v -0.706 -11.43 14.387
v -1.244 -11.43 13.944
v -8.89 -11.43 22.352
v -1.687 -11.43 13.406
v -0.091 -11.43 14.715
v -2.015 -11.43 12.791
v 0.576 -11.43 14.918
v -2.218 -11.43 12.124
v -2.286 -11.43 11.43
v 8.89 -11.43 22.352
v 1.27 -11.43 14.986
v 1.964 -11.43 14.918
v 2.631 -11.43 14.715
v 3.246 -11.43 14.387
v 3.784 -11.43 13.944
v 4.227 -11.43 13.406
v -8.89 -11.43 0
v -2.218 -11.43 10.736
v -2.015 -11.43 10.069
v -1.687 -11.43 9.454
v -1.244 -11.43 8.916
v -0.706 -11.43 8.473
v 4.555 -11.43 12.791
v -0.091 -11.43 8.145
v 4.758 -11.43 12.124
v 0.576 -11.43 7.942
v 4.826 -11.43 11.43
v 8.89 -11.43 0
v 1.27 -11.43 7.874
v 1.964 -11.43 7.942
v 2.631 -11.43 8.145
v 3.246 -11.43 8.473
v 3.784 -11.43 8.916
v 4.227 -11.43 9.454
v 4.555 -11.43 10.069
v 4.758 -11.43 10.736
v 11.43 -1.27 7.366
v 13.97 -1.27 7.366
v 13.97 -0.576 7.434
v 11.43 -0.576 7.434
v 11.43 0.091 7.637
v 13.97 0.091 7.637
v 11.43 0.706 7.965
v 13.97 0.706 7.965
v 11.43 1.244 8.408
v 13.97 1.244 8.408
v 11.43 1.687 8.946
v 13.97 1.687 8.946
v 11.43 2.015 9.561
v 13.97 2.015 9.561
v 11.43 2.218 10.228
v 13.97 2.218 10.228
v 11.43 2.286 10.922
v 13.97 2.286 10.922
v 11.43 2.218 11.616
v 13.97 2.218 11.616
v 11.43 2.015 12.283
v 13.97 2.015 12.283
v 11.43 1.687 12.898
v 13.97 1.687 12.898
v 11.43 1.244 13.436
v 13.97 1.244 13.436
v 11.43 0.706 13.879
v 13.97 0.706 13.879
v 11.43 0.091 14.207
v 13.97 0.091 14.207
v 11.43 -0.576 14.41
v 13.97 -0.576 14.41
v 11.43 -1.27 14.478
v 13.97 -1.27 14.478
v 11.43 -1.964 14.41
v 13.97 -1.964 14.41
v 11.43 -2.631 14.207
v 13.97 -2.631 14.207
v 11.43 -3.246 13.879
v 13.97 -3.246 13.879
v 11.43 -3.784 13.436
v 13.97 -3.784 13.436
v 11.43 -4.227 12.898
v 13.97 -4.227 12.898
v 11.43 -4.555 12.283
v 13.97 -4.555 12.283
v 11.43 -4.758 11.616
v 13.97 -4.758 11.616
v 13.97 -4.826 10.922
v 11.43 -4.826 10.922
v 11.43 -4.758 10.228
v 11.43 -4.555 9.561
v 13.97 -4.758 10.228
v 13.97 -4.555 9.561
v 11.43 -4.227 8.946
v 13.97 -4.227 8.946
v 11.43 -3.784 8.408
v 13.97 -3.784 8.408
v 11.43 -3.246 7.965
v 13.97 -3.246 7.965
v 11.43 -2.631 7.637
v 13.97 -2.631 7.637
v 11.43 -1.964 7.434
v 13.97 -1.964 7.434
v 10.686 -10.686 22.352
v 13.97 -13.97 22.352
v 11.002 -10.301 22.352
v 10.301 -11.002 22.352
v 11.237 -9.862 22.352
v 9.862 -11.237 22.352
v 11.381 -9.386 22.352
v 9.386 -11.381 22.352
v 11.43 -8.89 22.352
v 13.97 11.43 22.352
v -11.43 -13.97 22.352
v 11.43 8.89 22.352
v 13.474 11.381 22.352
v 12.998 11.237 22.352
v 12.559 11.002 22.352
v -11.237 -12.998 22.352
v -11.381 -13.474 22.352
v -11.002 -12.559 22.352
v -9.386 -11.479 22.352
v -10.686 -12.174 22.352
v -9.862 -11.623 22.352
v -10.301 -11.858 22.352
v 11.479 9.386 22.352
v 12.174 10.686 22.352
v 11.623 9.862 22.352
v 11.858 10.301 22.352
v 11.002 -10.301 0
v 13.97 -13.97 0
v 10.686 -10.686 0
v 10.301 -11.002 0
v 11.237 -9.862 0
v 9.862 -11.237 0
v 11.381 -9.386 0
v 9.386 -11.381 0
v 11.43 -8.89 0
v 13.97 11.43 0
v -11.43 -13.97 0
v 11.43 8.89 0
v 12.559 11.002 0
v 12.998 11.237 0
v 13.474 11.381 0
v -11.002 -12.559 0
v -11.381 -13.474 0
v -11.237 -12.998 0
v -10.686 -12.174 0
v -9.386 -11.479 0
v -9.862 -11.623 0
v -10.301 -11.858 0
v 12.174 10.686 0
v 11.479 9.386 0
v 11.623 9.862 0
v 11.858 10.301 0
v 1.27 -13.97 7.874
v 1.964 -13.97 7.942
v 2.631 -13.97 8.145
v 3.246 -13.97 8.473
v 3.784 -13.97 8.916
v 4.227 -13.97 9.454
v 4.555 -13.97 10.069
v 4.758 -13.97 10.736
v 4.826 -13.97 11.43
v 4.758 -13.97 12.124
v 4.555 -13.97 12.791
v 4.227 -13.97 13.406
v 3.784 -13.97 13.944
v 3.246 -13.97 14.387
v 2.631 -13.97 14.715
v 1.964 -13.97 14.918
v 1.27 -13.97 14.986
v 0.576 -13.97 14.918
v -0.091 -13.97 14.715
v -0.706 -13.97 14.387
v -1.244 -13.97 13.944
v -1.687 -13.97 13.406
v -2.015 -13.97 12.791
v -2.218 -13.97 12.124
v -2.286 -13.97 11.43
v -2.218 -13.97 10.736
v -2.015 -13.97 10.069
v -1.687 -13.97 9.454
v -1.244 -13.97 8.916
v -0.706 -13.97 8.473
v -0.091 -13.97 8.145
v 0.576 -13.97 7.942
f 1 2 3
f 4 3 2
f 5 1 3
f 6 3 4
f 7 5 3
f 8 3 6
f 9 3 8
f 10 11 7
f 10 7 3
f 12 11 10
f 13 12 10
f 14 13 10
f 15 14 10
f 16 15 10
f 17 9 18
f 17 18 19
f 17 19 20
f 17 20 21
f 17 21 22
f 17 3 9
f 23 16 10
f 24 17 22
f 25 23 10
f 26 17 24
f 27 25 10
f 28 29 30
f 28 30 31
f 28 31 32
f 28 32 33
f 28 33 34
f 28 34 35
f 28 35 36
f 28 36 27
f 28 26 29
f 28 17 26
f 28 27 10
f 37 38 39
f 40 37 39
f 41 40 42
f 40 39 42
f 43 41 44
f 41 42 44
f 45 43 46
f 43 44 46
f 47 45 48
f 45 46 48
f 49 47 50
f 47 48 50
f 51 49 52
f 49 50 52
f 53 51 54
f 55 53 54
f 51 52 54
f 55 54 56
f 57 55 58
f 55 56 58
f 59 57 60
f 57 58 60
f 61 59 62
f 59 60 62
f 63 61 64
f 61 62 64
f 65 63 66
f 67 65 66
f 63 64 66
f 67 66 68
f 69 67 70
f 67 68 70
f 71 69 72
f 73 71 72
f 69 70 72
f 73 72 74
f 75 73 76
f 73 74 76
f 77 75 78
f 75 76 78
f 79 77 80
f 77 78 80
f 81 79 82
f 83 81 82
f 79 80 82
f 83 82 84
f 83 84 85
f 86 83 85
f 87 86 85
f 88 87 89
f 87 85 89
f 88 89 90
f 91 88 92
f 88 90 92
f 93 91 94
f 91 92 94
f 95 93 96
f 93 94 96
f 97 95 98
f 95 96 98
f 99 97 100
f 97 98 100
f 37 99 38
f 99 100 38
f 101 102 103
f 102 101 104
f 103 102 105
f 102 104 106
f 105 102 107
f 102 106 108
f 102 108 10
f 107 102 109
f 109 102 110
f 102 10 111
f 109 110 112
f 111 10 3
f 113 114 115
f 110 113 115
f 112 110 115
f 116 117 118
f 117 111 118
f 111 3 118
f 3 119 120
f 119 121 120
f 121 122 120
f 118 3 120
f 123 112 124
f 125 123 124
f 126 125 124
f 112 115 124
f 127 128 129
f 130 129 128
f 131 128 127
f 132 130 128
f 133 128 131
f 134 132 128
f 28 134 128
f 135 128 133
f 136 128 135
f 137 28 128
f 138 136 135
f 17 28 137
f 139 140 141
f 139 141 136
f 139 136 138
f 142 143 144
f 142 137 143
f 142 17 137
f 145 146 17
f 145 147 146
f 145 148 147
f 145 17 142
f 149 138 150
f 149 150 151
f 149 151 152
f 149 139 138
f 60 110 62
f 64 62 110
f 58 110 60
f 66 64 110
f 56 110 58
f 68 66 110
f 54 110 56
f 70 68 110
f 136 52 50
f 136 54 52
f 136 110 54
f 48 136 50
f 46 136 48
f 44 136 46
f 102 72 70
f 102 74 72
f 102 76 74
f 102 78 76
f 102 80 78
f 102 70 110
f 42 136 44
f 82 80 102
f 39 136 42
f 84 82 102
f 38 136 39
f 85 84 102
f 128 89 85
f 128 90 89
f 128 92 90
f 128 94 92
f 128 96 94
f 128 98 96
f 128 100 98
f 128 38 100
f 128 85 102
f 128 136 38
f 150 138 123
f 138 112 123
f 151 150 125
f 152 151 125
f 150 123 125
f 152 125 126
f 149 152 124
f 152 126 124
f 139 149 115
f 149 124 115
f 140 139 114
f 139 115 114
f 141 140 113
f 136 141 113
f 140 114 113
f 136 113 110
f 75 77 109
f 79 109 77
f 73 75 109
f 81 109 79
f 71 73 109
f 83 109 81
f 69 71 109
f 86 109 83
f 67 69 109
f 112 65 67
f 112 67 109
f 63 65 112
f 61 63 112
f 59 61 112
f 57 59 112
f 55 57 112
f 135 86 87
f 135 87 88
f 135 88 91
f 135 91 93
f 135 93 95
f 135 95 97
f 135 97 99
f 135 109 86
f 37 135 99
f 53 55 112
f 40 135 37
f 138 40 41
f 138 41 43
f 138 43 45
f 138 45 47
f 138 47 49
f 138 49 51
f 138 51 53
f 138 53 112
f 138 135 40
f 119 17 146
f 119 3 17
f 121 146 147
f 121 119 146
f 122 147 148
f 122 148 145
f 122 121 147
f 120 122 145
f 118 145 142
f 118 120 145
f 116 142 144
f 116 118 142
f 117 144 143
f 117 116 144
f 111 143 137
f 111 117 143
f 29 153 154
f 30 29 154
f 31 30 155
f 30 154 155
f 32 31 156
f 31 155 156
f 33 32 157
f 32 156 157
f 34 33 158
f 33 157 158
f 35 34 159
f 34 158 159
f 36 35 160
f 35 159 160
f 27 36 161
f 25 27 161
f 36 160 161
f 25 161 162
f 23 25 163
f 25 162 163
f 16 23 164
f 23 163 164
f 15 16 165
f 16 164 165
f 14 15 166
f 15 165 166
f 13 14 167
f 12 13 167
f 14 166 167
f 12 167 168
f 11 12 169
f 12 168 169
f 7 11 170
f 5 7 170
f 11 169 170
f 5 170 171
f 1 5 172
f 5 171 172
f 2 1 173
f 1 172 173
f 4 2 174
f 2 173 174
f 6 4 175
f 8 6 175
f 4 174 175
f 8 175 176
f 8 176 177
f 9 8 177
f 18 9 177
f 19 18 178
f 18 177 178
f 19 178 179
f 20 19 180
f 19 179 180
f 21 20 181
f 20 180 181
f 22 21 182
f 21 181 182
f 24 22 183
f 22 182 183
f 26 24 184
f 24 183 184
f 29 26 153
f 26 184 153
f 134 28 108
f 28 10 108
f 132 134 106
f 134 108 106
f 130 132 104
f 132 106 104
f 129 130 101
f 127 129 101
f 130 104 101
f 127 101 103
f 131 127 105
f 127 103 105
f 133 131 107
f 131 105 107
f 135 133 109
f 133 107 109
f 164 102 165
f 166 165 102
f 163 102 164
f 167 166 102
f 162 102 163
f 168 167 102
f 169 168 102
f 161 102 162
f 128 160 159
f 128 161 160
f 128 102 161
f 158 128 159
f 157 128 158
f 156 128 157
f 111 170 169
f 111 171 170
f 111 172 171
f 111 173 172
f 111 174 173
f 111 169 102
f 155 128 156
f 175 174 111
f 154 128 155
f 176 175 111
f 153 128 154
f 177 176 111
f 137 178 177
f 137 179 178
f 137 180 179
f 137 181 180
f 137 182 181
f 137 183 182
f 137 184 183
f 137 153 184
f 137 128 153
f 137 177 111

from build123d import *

# Parameters (mm, degrees)
EXTRUDE_THIN1_DEPTH = 22.352
FILLET1_R           = 2.54
SKETCH2_R           = 3.556
CUT_EXTRUDE1_DEPTH  = 2.54
SKETCH3_R           = 3.556
CUT_EXTRUDE2_DEPTH  = 2.54


with BuildPart() as part:
    # Sketch1 → Extrude-Thin1 (new body)
    with BuildSketch(Plane.XY):
        Polygon((-11.43, -11.43), (11.43, -11.43), (11.43, 11.43), (13.97, 11.43), (13.97, -13.97), (-11.43, -13.97), align=None)
    extrude(amount=EXTRUDE_THIN1_DEPTH)

    # Fillet1
    fillet1_edges = [part.edges().sort_by_distance(p)[0] for p in [
        (11.43, 11.43, 11.176),
        (-11.43, -11.43, 11.176),
        (11.43, -11.43, 11.176),
    ]]
    fillet(fillet1_edges, radius=FILLET1_R - 0.0001)  # a hair under: the kernel refuses the full size

    # Sketch2 → Cut-Extrude1 (cut)
    with BuildSketch(Plane.XZ.offset(13.97)):
        with Locations(Location((1.27, 11.43, 0), (0, 0, 270))):
            Circle(SKETCH2_R)
    extrude(amount=-CUT_EXTRUDE1_DEPTH, mode=Mode.SUBTRACT)

    # Sketch3 → Cut-Extrude2 (cut)
    with BuildSketch(Plane(origin=(13.97, 0, 0), x_dir=(0, 0, -1), z_dir=(1, 0, 0))):
        with Locations((-10.922, -1.27)):
            Circle(SKETCH3_R)
    extrude(amount=-CUT_EXTRUDE2_DEPTH, mode=Mode.SUBTRACT)


solid = part.part
